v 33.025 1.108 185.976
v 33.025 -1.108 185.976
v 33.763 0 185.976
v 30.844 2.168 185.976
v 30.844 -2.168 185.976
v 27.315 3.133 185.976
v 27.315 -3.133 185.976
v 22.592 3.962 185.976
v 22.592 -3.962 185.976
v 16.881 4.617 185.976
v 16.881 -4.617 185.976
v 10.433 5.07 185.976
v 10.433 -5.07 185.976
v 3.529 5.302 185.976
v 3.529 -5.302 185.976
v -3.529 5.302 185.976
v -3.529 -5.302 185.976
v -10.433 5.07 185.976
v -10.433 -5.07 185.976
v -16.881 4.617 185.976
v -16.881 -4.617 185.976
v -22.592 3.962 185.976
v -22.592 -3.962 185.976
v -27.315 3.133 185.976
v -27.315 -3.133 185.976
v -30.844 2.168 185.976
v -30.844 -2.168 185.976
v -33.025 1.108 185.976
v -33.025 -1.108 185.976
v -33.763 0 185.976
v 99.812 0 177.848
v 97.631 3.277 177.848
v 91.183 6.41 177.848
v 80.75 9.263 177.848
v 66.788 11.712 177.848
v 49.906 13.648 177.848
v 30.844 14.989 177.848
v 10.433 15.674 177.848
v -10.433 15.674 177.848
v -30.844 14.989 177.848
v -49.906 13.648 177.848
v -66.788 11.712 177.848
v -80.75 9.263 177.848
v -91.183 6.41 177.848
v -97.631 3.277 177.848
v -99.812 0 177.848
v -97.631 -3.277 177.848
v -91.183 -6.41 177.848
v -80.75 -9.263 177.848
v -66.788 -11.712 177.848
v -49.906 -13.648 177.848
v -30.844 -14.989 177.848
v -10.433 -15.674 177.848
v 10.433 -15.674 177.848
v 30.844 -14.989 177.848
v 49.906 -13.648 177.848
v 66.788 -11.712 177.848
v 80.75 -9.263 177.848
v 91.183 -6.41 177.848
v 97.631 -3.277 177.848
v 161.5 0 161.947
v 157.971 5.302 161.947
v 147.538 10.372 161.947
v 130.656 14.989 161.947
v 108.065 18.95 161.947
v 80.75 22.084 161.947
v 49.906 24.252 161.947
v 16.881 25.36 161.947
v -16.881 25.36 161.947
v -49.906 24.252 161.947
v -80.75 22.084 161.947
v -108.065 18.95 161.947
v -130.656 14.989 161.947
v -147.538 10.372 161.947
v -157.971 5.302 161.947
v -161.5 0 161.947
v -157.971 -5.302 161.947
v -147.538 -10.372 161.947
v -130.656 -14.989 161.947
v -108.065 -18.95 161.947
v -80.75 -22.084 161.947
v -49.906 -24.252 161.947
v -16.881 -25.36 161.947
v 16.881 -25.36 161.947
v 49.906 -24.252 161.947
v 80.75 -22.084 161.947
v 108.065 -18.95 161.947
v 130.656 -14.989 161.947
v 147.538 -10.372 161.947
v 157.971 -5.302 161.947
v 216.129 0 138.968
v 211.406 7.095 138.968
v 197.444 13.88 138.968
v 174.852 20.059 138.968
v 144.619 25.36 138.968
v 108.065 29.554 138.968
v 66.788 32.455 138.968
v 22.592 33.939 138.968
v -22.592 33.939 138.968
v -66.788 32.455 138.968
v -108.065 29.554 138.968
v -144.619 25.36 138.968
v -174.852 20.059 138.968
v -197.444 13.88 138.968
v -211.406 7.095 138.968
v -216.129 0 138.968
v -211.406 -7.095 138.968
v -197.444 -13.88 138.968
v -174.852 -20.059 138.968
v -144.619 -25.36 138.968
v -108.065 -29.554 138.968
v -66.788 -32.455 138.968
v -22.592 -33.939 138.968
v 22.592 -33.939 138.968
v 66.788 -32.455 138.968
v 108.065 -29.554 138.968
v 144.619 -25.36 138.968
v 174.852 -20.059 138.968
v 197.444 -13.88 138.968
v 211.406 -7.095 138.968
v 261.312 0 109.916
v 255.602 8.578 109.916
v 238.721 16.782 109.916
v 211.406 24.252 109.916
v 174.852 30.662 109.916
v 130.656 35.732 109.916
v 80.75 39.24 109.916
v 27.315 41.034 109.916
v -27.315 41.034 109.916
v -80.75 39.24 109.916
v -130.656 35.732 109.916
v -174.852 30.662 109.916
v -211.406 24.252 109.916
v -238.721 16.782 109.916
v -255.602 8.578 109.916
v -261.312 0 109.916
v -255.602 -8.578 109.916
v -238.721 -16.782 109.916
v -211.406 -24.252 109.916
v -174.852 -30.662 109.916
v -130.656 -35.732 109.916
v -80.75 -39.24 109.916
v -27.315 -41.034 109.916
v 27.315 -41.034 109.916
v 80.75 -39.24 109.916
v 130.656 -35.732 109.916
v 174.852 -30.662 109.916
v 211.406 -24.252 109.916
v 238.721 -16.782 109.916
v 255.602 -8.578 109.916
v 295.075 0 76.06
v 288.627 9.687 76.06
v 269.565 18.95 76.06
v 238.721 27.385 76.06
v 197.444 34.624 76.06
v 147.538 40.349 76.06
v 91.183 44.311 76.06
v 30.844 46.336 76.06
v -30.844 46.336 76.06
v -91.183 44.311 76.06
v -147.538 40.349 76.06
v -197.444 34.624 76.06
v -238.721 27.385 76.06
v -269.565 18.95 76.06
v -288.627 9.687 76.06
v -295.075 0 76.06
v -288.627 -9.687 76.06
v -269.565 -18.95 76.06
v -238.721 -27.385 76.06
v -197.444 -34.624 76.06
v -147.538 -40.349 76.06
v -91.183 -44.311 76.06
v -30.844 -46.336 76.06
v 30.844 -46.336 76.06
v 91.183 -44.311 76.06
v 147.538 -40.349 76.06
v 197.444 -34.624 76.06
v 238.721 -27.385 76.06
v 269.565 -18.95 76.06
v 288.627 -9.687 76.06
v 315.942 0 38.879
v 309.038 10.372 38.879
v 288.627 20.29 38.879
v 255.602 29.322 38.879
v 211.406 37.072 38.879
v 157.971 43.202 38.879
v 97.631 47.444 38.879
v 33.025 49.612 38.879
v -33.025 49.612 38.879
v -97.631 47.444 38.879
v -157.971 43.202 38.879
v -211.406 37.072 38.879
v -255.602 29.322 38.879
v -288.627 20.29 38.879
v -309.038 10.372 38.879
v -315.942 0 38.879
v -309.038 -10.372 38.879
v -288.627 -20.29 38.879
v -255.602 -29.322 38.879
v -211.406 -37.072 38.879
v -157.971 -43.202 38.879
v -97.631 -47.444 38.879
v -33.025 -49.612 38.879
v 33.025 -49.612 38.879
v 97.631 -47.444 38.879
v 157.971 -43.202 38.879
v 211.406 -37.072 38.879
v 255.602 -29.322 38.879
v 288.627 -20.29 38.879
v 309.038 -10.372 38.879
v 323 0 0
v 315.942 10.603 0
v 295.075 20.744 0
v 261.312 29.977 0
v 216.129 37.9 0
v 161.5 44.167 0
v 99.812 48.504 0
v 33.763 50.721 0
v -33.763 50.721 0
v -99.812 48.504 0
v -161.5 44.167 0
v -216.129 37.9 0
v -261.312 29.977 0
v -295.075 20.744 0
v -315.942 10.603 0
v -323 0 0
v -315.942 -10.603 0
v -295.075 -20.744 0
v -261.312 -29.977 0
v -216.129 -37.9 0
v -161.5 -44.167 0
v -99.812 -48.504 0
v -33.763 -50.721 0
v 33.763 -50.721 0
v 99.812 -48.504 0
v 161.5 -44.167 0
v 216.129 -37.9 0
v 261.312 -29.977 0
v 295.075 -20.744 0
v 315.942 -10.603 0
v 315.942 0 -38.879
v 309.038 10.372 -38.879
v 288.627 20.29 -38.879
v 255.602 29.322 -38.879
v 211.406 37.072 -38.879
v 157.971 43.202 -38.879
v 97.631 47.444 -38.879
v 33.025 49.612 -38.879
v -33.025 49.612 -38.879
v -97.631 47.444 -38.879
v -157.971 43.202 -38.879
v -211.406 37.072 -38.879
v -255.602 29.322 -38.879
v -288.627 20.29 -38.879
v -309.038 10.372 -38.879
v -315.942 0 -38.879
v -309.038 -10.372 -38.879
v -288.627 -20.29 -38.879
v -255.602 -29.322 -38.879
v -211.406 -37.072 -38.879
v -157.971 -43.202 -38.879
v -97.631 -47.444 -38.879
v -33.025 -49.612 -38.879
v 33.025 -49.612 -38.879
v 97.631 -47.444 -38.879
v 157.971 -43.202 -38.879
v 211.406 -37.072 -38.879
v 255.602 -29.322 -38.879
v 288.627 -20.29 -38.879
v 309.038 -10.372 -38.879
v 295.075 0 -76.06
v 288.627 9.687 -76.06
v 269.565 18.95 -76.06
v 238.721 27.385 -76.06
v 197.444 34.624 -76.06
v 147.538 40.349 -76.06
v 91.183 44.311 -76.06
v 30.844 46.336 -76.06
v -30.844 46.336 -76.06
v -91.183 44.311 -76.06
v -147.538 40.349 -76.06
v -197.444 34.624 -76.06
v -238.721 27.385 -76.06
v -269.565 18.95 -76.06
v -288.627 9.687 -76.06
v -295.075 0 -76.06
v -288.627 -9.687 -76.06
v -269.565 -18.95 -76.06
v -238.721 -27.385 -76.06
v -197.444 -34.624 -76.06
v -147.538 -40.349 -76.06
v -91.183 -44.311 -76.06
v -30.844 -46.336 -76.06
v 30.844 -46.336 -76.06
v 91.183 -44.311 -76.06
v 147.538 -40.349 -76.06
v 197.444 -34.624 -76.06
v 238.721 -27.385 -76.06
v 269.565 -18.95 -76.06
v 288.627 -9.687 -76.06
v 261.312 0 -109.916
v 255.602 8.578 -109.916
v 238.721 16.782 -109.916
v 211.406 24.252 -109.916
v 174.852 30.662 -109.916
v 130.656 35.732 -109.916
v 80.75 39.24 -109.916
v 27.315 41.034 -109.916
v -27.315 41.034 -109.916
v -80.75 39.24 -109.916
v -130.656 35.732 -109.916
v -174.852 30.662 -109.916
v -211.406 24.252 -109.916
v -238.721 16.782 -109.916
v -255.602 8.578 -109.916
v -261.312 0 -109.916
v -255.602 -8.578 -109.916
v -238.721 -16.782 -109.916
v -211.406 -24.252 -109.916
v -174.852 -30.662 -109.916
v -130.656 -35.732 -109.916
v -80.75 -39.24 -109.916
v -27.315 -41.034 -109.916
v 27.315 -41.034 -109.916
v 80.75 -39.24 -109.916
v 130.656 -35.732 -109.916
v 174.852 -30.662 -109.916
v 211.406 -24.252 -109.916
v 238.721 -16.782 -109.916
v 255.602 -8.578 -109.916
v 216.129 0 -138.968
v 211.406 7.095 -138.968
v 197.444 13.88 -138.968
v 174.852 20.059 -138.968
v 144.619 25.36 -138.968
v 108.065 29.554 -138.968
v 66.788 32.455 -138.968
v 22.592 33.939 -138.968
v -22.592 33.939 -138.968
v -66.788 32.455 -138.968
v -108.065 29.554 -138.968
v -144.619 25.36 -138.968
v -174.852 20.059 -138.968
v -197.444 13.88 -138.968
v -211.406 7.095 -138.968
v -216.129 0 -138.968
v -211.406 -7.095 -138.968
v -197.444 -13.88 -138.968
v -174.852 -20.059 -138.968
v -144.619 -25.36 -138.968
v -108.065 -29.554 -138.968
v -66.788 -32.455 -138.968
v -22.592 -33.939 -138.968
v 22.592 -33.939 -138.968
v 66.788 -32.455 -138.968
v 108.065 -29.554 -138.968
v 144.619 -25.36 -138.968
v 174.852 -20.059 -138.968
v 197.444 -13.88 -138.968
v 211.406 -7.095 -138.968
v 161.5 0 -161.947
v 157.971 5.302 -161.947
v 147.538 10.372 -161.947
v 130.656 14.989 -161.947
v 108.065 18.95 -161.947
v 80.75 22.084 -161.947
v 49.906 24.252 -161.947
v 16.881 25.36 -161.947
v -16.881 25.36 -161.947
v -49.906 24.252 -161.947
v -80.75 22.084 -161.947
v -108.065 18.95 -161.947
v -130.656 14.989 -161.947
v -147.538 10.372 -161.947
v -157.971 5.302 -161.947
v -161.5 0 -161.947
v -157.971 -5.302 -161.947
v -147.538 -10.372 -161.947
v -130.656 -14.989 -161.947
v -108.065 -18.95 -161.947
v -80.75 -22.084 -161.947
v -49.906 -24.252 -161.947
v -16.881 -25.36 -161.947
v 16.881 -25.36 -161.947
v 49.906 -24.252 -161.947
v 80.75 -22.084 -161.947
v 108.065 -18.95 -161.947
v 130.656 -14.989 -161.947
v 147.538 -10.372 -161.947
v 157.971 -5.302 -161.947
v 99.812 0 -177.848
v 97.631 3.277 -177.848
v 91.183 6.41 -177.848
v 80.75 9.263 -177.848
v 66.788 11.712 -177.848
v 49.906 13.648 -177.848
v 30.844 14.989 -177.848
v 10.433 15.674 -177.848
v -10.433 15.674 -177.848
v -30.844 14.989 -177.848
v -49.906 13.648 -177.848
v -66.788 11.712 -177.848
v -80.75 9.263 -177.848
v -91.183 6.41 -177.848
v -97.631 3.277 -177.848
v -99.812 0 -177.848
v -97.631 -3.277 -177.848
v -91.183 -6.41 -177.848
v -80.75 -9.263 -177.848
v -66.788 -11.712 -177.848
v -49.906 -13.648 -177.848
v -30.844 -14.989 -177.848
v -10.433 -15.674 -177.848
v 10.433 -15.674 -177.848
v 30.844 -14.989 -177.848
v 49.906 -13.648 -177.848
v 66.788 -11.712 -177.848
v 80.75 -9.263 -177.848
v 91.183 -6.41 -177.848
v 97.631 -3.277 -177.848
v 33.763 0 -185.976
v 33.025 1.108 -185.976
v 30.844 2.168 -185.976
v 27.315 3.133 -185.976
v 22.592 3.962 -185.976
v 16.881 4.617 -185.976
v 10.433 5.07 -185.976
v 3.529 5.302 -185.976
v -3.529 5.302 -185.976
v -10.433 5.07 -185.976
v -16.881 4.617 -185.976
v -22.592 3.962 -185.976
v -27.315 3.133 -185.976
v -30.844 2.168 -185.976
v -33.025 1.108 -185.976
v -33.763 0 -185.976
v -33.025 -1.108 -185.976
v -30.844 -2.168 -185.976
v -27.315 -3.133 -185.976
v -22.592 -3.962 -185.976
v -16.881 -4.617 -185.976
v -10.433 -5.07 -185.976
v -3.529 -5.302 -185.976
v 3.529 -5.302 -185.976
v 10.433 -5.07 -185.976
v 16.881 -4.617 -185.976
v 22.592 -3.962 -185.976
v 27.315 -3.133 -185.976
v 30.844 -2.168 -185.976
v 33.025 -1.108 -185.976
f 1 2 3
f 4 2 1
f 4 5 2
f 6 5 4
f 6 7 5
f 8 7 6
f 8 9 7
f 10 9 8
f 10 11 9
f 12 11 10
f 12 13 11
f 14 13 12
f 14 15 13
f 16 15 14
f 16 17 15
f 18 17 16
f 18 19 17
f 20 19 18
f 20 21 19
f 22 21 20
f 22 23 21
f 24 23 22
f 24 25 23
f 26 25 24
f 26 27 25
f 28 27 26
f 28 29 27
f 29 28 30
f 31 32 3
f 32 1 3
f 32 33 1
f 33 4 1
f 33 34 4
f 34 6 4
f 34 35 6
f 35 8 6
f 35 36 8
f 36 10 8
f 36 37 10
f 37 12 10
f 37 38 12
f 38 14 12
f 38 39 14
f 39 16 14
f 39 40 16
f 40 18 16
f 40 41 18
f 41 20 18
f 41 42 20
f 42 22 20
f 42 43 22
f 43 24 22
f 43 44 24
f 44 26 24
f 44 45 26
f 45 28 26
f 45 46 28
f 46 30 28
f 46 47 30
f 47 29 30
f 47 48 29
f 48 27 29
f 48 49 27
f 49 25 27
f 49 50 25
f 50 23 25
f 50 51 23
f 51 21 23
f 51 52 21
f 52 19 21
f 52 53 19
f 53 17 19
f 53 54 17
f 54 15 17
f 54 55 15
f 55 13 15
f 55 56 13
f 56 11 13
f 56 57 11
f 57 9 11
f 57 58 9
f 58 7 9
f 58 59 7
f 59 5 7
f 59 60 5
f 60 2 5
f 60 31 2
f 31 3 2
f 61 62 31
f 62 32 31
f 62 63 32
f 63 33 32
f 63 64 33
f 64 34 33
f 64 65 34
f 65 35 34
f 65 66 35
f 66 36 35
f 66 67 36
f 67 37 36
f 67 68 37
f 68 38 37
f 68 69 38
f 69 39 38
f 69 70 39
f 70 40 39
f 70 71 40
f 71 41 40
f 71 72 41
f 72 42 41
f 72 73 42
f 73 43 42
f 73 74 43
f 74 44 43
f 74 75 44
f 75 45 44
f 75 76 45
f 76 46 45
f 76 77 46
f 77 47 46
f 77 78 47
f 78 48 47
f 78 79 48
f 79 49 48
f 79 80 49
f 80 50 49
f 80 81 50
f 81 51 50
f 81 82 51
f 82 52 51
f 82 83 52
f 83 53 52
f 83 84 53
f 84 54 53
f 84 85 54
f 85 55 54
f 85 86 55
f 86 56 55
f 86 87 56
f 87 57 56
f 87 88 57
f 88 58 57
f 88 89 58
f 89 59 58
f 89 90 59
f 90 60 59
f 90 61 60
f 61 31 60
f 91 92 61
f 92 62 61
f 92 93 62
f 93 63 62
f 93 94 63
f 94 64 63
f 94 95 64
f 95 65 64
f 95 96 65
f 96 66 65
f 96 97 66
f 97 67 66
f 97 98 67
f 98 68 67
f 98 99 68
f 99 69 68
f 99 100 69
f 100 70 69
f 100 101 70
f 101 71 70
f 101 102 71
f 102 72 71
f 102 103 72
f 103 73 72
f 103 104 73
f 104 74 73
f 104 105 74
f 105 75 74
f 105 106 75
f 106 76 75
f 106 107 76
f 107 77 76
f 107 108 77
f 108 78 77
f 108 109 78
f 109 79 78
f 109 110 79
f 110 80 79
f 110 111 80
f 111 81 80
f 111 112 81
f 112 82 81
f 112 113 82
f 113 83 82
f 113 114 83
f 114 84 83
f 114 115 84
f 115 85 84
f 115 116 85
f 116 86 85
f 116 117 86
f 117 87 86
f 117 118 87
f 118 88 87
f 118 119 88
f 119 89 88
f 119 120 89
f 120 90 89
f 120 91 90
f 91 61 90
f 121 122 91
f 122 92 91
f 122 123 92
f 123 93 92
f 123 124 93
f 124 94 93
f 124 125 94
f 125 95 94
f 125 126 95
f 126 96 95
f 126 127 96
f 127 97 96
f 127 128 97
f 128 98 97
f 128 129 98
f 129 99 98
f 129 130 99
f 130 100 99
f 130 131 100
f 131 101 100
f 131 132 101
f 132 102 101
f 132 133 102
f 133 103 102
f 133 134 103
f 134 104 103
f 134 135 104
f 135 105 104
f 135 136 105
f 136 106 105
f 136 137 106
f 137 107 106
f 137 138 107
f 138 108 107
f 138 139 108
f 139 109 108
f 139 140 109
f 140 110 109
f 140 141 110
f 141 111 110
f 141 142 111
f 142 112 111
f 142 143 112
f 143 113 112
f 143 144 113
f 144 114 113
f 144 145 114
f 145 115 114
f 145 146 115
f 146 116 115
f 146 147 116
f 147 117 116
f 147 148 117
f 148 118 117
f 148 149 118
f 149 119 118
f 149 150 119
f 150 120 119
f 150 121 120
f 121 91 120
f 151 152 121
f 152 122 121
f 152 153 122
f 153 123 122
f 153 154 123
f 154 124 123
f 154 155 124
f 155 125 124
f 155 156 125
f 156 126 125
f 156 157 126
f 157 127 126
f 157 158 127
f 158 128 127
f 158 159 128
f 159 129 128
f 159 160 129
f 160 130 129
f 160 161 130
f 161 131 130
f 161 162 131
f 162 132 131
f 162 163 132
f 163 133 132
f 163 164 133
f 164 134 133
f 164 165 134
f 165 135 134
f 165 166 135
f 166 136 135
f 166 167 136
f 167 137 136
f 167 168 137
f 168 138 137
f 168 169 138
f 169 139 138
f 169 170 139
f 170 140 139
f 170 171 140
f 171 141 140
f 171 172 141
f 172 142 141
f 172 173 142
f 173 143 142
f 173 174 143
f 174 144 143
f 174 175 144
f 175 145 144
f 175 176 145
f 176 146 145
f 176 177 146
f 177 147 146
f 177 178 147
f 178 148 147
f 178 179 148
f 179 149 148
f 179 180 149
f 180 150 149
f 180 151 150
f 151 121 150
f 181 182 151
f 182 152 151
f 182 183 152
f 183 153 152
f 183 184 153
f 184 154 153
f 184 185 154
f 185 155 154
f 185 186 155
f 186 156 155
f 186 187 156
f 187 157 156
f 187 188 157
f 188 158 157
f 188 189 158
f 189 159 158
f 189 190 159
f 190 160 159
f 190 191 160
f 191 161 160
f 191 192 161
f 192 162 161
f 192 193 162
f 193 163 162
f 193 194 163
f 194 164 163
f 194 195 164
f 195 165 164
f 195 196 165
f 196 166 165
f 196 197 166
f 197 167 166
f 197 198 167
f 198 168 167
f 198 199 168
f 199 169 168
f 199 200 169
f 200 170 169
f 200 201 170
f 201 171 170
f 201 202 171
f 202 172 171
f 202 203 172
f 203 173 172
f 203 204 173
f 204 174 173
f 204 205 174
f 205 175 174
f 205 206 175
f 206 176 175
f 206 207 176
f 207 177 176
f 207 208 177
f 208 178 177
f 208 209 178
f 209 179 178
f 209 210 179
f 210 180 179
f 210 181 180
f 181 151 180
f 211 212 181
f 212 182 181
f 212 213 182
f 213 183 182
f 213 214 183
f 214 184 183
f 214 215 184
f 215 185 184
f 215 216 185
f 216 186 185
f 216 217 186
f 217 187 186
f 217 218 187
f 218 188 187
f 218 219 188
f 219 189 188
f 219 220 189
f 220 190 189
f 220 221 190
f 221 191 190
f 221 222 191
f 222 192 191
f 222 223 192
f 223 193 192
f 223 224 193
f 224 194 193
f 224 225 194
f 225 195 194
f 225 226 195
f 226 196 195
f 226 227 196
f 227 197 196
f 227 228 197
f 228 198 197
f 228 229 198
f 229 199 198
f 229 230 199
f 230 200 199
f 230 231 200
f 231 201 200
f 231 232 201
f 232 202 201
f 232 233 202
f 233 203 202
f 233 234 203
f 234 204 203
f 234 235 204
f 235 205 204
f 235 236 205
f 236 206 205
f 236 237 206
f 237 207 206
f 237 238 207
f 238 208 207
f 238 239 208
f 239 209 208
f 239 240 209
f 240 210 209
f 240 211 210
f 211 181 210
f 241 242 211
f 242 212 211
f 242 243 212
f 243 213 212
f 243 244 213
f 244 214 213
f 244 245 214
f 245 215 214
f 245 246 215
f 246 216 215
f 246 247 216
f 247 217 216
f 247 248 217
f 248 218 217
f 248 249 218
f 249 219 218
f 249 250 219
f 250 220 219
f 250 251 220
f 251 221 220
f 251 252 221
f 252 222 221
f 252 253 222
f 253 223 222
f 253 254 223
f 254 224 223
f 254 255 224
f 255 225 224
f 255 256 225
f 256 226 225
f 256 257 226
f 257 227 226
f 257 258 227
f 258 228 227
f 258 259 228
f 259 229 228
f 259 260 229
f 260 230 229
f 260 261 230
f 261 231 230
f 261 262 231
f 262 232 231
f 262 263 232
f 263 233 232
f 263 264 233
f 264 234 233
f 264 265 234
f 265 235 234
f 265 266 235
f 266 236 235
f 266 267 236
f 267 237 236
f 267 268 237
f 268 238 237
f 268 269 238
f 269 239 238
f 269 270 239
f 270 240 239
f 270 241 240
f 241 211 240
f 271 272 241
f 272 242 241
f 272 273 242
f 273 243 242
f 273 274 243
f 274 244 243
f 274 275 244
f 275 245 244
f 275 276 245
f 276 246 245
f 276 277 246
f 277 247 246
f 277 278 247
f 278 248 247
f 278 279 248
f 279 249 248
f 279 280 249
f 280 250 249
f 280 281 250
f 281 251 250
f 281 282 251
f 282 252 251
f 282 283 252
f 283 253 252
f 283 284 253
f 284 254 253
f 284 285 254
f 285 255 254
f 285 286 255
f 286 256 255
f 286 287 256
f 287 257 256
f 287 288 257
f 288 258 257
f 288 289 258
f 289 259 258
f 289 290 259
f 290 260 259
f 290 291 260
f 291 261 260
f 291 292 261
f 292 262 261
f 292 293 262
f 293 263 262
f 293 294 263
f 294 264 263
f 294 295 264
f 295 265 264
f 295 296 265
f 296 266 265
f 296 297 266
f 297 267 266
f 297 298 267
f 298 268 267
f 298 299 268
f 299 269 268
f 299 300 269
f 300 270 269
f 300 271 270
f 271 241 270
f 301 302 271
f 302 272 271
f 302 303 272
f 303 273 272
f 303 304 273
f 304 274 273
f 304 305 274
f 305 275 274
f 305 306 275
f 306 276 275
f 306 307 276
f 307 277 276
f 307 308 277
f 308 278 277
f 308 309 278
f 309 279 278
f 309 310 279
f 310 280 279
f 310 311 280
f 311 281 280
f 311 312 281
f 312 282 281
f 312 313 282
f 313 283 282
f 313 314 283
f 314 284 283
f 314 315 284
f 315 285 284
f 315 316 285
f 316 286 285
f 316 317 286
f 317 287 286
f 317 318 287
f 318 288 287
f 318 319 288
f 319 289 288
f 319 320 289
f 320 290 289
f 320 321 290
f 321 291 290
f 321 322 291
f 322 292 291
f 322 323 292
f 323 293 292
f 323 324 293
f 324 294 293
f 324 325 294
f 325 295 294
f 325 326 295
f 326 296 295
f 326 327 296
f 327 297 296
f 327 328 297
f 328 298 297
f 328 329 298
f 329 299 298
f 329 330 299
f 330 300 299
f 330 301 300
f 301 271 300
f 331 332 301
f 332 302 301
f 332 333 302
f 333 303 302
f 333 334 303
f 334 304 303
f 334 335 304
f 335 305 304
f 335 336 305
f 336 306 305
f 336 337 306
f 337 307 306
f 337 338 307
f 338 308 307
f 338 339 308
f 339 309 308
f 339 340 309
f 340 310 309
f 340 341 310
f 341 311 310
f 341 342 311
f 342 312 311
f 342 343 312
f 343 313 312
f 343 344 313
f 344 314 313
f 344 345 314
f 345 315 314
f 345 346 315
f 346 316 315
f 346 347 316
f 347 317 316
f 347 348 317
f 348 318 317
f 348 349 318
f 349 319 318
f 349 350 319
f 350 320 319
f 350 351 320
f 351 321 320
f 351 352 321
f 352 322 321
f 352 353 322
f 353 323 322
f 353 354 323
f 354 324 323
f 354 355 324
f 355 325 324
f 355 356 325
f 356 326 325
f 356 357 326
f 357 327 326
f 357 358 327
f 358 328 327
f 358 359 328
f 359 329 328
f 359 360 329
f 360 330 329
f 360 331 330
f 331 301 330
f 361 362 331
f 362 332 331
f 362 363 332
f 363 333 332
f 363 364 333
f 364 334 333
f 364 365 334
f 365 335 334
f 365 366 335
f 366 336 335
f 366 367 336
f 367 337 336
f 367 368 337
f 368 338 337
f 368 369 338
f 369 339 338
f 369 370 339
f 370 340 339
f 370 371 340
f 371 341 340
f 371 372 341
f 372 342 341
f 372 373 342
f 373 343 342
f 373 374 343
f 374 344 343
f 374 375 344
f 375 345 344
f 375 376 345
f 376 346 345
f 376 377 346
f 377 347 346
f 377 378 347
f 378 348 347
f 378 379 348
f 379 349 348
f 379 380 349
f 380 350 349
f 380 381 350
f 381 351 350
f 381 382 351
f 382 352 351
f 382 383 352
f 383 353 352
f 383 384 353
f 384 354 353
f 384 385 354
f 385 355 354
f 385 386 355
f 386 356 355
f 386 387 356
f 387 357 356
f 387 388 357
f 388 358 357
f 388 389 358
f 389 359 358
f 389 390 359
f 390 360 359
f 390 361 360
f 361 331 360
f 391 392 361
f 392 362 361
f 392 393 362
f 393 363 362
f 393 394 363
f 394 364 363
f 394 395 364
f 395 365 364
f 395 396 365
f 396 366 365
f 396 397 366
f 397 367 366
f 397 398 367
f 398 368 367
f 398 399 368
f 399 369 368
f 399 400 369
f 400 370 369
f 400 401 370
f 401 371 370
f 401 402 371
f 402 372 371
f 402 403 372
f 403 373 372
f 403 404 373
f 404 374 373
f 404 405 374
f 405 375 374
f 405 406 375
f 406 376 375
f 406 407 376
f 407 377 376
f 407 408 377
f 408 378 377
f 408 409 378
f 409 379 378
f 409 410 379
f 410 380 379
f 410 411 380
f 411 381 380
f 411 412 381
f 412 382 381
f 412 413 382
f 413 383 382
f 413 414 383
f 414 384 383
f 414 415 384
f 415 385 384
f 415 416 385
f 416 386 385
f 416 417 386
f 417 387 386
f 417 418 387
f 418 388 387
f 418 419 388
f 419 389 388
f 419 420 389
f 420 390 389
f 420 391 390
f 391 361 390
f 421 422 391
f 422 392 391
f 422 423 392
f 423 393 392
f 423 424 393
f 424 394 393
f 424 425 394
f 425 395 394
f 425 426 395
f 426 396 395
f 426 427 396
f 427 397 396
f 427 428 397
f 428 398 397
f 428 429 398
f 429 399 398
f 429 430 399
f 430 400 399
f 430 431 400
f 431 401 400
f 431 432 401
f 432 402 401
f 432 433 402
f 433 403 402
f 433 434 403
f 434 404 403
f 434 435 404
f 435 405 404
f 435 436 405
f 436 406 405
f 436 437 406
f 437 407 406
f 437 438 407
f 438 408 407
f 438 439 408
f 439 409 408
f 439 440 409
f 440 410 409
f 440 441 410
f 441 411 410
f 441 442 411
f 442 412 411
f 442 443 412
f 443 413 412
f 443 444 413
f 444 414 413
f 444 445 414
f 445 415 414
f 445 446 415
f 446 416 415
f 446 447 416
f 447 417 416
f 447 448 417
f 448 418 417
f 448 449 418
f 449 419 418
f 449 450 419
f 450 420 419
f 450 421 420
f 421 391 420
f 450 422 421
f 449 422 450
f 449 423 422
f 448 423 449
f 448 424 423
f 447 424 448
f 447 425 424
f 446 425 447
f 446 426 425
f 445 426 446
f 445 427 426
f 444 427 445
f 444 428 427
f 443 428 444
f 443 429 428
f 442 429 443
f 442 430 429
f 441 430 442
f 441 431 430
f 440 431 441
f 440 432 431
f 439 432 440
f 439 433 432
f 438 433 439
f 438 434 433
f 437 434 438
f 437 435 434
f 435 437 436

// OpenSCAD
// Generated by SolidPython 1.0.1 on 2020-07-29 00:46:53


scale(v = [19, 3, 11]) {
	sphere(r = 17);
}
/***********************************************
*********      SolidPython code:      **********
************************************************
 
# import packages: SolidPython
from solid import *
from solid.utils import *
from itertools import chain, combinations, permutations


class Resize:

    def __init__(self, scad_file):
        self.scad_file = scad_file
        #self.scad_file = import_scad(scad_file)
        # cone/cylinder param:
        self.r1 = 0
        self.r2 = 0
        self.h = 0
        # rectangular prism param:
        self.w = 0
        self.l = 0
        # ellipse param:
        self.r = 0

    # import OpenScad code (file name corresponds to shape)


    # classify shape + parameters
    def assign(self, param1, param2, param3):
        if self.scad_file == 'cone.scad':
            self.r1 = param1
            self.r2 = param2
            self.h = param3
        elif self.scad_file == 'cylinder.scad':
            self.r1 = param1
            self.r2 = param2
            self.h = param3
        elif self.scad_file == 'rectangularPrism.scad':
            self.h = param1
            self.l = param2
            self.w = param3
        else:
            self.r = param1
            self.h = param2

    # resize parameters
    def iterate(self):
        x = range(3, 20, 2)
        i = 1
        if self.scad_file == 'cone.scad':
            tempList = list(permutations(x, 2))
            for temp in tempList:
                param1 = temp[0]
                param2 = temp[1]
                filepath = 'produced_scad_files/' + 'cone' + str(param1) + '_' + str(param2) + '_' + '.scad'
                scad_render_to_file(cylinder(h=param1, r1=param2, r2=0), filepath)

        elif self.scad_file == 'cylinder.scad':
            tempList = list(permutations(x, 3))
            for temp in tempList:
                param1 = temp[0]
                param2 = temp[1]
                filepath = 'produced_scad_files/' + 'cylinder' + str(param1) + '_' + str(param2) + '_' + '.scad'
                scad_render_to_file(cylinder(h=param1, r1=param2, r2=param2), filepath)

        elif self.scad_file == 'rectangularPrism.scad':
            tempList = list(permutations(x, 3))
            for temp in tempList:
                param1 = temp[0]
                param2 = temp[1]
                param3 = temp[2]
                filepath = 'produced_scad_files/' + 'rectangularPrism' + str(param1) + '_' + str(param2) + '_' + str(
                    param3) + '.scad'
                scad_render_to_file(cube(size=(param1, param2, param3)), filepath)

        elif self.scad_file == 'ellipse.scad':
            tempList = list(permutations(x, 4))
            for temp in tempList:
                param1 = temp[0]
                param2 = temp[1]
                param3 = temp[2]
                param4 = temp[3]
                filepath = 'produced_scad_files/' + 'ellipse' + str(param1) + '_' + str(param2) + '_' + str(param3) + '_' + str(param4) + '.scad'
                scad_render_to_file(scale([param1, param2, param3])(sphere(r=param4)), filepath)

    def render_to_scadfile(self):
        scad_render_to_file(scad, 'example.scad') 
 
************************************************/
